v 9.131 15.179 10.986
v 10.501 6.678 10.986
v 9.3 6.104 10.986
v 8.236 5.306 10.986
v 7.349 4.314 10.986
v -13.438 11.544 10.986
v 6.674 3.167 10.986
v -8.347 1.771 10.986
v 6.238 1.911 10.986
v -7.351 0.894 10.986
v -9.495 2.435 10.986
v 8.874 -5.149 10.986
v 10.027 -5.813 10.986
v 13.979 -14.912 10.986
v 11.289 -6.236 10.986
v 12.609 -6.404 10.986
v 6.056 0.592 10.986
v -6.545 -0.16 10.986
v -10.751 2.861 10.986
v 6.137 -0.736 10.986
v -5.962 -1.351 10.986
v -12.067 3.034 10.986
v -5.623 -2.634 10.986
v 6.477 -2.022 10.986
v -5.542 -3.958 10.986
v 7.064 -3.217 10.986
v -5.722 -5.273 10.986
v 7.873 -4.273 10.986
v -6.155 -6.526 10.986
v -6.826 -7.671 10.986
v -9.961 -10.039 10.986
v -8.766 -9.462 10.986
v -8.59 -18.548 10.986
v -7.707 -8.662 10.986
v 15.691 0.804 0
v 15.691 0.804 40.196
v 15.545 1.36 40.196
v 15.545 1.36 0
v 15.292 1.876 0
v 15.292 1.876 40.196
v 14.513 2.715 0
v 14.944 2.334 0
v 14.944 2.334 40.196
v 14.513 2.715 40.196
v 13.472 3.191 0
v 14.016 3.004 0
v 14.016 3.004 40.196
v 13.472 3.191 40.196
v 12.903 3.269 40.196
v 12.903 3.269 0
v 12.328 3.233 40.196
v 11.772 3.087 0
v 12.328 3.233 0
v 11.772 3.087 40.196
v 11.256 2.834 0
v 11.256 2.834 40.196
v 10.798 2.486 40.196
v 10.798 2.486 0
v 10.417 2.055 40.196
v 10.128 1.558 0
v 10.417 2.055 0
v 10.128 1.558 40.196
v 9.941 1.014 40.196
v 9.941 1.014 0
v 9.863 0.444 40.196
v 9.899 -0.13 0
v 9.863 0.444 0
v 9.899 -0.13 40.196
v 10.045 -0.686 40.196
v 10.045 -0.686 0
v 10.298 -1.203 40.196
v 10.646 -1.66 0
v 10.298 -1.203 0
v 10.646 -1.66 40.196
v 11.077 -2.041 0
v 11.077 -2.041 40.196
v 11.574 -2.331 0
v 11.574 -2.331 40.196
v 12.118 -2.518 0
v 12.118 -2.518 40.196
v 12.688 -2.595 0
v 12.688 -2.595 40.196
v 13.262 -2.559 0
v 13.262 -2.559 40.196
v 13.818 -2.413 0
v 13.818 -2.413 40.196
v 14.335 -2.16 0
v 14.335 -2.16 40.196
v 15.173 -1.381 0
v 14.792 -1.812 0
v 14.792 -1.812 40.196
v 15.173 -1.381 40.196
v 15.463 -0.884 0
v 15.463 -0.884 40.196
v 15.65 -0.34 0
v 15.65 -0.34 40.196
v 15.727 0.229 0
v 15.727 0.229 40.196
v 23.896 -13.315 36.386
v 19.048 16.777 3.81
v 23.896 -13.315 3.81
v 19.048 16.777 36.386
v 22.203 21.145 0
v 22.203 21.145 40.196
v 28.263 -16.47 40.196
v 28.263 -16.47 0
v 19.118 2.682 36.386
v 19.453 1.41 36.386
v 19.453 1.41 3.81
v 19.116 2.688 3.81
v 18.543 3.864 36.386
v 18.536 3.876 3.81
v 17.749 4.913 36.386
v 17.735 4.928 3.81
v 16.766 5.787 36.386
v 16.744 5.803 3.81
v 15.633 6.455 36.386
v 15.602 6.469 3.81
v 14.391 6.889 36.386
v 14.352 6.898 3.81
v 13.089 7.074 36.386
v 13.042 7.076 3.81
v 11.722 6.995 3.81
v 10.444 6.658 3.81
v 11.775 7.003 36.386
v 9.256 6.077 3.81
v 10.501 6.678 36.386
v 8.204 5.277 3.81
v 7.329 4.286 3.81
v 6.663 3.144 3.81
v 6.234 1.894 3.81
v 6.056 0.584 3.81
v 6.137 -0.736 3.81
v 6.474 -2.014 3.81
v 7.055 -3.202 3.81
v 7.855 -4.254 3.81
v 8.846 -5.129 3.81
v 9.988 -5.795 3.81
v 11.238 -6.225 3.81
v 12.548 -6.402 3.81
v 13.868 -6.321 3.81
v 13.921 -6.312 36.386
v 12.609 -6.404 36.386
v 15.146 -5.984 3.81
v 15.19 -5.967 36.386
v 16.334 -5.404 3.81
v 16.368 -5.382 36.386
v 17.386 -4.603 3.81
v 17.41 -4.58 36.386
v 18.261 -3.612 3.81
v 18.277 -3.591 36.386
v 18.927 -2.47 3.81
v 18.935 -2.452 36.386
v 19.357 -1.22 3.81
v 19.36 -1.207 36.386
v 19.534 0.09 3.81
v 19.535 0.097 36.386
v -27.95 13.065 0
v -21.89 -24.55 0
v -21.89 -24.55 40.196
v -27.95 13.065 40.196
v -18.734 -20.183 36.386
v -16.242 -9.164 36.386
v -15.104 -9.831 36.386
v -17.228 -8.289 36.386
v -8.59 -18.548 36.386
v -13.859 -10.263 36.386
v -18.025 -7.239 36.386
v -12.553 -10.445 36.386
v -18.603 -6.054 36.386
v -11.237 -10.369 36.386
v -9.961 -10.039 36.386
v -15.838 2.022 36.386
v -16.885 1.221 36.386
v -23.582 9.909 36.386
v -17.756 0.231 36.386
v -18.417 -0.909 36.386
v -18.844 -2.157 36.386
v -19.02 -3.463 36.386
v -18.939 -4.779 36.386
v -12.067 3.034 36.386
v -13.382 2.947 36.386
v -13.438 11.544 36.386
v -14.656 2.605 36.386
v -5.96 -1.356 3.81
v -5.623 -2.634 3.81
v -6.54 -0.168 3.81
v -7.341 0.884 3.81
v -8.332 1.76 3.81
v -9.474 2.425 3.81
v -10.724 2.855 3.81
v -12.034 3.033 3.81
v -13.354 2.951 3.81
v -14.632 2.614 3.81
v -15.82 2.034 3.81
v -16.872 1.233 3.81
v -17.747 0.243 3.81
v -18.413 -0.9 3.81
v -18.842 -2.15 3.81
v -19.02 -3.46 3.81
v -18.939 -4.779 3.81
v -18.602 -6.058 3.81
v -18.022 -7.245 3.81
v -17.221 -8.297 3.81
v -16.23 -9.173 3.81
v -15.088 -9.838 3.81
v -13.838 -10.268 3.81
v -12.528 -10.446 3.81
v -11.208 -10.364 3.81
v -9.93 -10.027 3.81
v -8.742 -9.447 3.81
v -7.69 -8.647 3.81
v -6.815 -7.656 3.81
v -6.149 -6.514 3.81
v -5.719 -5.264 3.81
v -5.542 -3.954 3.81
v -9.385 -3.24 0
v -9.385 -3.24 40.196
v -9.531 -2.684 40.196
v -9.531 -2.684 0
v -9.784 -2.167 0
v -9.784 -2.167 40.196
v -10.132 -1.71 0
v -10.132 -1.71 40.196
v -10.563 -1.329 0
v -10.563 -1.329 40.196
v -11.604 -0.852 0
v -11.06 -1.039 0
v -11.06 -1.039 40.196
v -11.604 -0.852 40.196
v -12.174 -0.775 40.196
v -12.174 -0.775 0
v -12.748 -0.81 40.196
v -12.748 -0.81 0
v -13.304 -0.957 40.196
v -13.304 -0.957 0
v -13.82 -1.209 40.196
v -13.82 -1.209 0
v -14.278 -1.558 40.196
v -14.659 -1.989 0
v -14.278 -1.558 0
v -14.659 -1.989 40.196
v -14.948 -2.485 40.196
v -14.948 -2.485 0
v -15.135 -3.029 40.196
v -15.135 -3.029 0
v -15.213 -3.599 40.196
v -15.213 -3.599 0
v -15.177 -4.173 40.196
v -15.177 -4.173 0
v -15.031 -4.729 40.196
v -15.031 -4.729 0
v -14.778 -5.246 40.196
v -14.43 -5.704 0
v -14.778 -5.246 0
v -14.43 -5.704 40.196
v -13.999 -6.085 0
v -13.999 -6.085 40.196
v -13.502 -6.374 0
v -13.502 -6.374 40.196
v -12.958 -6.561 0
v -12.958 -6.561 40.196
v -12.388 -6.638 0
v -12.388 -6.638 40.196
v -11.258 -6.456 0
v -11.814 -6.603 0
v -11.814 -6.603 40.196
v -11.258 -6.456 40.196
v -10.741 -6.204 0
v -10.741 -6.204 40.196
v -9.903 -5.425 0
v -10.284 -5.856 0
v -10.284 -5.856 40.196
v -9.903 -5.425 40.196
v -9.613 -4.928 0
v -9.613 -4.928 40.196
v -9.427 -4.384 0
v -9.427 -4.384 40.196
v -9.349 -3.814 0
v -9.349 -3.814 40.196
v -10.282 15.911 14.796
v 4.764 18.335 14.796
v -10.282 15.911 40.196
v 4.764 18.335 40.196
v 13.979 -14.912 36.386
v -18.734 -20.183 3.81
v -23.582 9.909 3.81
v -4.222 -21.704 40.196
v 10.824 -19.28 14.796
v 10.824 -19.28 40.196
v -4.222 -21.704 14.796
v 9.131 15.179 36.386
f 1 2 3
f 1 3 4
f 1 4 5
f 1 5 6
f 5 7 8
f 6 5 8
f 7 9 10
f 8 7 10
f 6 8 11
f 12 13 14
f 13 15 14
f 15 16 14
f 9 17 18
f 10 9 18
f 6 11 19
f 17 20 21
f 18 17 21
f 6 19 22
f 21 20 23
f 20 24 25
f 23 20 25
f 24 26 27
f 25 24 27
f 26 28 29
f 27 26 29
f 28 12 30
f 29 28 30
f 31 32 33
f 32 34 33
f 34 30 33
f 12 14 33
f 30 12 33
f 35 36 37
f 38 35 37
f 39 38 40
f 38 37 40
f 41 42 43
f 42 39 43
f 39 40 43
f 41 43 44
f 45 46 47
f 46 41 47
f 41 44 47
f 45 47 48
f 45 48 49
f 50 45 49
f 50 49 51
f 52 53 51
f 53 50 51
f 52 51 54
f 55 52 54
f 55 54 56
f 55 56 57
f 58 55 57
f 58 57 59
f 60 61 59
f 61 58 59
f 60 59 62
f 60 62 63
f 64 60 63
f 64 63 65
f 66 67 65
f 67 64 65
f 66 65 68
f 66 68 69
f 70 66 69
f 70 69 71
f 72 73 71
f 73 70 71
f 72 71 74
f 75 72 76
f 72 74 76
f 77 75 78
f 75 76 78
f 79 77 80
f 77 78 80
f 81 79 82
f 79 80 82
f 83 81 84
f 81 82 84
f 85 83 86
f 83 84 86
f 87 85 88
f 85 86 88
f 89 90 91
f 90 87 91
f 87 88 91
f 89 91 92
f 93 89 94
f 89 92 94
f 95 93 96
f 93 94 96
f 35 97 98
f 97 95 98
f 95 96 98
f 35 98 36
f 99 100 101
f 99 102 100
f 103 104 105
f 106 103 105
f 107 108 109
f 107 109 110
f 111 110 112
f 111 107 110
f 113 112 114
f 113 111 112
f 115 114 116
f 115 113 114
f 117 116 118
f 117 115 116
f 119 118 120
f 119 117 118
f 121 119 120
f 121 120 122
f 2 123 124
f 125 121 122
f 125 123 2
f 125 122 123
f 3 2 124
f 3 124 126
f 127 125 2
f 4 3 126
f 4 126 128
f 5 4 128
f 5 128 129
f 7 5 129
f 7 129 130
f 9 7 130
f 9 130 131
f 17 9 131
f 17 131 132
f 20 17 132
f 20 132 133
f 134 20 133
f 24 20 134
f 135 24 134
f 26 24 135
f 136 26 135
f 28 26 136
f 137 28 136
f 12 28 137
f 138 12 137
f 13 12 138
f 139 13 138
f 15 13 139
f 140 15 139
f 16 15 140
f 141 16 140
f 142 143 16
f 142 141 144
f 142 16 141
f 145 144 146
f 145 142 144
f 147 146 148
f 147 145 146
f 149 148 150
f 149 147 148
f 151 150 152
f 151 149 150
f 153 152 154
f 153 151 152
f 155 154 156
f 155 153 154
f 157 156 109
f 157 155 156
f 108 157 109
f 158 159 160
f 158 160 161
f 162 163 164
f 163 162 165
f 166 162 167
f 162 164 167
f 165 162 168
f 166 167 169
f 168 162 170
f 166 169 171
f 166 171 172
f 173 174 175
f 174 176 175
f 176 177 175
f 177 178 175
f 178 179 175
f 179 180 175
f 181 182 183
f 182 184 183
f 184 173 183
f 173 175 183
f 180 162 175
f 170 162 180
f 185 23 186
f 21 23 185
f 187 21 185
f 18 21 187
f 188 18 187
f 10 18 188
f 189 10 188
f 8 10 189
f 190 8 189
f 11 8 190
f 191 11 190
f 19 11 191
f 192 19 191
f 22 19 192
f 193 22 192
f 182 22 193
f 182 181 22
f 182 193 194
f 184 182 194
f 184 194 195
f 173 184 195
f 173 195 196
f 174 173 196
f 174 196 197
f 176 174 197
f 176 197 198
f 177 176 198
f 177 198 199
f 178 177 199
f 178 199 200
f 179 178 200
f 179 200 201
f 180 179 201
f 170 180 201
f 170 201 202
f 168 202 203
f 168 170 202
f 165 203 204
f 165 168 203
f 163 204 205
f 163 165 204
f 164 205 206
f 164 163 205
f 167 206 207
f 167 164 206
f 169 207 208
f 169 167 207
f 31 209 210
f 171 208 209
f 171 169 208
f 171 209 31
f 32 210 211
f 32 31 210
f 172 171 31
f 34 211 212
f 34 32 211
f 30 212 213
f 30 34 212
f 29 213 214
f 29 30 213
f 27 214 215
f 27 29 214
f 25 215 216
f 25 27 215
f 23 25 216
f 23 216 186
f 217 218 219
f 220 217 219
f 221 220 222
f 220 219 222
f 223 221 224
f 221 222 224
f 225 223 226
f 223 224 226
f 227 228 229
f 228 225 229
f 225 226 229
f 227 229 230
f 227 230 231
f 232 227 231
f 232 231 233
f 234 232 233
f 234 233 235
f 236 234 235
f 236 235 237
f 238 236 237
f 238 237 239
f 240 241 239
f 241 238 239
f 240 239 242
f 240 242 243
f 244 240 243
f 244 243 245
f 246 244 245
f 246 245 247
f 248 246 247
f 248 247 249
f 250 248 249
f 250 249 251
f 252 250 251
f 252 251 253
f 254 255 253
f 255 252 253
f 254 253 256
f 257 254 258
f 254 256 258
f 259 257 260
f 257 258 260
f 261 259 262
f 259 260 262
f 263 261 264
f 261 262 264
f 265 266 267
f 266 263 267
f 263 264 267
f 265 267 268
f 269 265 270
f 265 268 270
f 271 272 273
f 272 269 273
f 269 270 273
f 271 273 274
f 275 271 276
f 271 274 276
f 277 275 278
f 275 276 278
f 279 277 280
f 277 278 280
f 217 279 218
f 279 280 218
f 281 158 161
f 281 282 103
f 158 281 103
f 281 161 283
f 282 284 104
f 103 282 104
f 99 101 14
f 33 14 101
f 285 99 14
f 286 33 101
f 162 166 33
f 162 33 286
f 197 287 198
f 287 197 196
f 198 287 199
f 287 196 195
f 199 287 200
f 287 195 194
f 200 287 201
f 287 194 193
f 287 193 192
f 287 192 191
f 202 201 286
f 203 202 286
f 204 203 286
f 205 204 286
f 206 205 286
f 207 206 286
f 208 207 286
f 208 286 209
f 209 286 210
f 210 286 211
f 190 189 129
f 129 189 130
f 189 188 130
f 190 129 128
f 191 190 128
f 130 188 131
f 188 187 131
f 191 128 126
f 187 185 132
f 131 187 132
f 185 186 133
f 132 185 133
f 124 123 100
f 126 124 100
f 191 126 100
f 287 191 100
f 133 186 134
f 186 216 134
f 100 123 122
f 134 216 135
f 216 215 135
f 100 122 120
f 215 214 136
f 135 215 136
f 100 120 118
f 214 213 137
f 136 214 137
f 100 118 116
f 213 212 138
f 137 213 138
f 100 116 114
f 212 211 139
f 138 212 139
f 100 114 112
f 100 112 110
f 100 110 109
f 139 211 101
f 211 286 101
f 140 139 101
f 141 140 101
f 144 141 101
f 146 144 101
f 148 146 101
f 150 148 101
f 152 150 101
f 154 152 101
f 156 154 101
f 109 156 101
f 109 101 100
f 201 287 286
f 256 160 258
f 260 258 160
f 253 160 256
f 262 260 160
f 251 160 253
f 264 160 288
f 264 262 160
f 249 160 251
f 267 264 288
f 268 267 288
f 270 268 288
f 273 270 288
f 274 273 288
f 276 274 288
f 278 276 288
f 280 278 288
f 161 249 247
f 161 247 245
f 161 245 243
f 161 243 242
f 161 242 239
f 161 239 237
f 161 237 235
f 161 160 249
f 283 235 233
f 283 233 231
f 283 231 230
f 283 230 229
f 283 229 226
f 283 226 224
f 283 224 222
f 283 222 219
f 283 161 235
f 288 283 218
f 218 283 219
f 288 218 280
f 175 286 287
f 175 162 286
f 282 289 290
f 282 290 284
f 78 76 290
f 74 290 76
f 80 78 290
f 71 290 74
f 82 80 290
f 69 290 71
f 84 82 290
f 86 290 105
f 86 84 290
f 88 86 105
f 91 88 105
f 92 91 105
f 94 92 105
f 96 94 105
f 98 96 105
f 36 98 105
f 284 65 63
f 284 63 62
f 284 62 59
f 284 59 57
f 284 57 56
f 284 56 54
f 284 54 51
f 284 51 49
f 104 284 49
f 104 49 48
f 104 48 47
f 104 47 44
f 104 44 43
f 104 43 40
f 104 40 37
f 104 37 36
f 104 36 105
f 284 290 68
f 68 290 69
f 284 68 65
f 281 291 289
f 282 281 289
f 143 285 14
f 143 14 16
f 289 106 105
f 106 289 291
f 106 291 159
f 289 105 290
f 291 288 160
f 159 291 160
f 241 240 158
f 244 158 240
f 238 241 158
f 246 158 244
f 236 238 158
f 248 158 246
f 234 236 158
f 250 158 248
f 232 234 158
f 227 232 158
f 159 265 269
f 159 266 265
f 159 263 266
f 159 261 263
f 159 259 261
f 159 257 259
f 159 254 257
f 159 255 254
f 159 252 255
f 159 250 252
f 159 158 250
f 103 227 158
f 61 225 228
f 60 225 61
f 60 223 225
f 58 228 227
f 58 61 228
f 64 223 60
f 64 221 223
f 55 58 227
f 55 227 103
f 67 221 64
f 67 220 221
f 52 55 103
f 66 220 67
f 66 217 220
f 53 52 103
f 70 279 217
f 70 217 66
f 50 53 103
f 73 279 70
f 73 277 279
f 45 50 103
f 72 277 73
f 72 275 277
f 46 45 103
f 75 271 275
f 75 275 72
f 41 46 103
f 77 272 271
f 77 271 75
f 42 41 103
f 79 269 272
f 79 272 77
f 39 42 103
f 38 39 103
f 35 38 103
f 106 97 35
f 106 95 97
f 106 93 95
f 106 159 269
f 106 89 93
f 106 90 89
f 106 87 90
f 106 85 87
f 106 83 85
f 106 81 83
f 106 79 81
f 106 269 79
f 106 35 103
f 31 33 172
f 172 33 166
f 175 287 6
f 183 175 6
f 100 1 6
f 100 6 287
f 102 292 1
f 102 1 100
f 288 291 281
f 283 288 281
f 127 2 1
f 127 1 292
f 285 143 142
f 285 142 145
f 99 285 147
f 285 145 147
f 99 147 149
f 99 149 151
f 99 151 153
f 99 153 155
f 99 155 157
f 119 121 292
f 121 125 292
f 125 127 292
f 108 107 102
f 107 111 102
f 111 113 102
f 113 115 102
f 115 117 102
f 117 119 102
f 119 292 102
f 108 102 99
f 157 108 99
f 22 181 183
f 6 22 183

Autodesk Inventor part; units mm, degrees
ref_plane "YZ Plane" through (0, 0, 0) normal (1, 0, 0) x (0, 1, 0)
ref_plane "XZ Plane" through (0, 0, 0) normal (0, 1, 0) x (-1, 0, 0)
ref_plane "Work Plane1" through (1.0078, -6.2592, 14.7955) normal (0, 0, -1) x (0.9872698, 0.1590547, 0)
sketch "Sketch1" plane through (1.0078, -6.2592, 14.7955) normal (0, 0, -1) x (0.9872698, 0.1590547, 0)
  circle A0 centre (12.6864, -4.6373) radius 2.9337 projected
  circle A1 centre (-12.7136, -4.6337) radius 2.9337 projected
  line L0 (25.2845, 14.4163) -> (-25.5155, 14.4163)
  line L1 (-25.5155, 14.4163) -> (-25.5155, -23.6837)
  line L2 (-25.5155, -23.6837) -> (25.2845, -23.6837)
  line L3 (25.2845, -23.6837) -> (25.2845, 14.4163)
  point P0 (0.0006, -6.3398)
  dimension "d0" = 50.8
  dimension "d1" = 38.1
  dimension "d2" = 19.05
  dimension "d3" = 12.8018
ref_plane "Work Plane2" through (-93.6315, -146.1207, 0) normal (0, 0, 1) x (1, 0, 0)
extrude "Extrusion1" add sketch "Sketch1" along normal up to surface (14.7955 mm away)
sketch "Sketch2" plane through (1.0078, -6.2592, 14.7955) normal (0, 0, 1) x (0.9872698, 0.1590547, 0)
  line L0 (6.35, -58.321) -> (6.35, 48.9196) projected
  line L1 (-6.35, 49.2476) -> (-6.35, -58.321) projected
  circle A0 centre (-12.7136, 4.6337) radius 2.9337 projected
  circle A1 centre (12.6864, 4.6373) radius 2.9337 projected
  line L2 (25.2845, -14.4163) -> (-25.5155, -14.4163) projected
  line L3 (25.2845, 23.6837) -> (25.2845, -14.4163) projected
  line L4 (-25.5155, 23.6837) -> (25.2845, 23.6837) projected
  line L5 (-25.5155, -14.4163) -> (-25.5155, 23.6837) projected
  line L6 (25.2845, -14.4163) -> (-25.5155, -14.4163) projected
  line L7 (25.2845, -14.4163) -> (7.62, -14.4163)
  line L8 (7.62, -14.4163) -> (7.62, 23.6837)
  line L9 (7.62, 23.6837) -> (25.2845, 23.6837)
  line L10 (25.2845, 23.6837) -> (25.2845, -14.4163)
  line L11 (-25.5155, -14.4163) -> (-25.5155, 23.6837) projected
  line L12 (-25.5155, -14.4163) -> (-7.62, -14.4163)
  line L13 (-7.62, -14.4163) -> (-7.62, 23.6837)
  line L14 (-7.62, 23.6837) -> (-25.5155, 23.6837)
  line L15 (-25.5155, 23.6837) -> (-25.5155, -14.4163)
  point P0 (0.0006, 6.3398)
  dimension "d6" = 1.27
  dimension "d7" = 1.27
extrude "Extrusion2" add sketch "Sketch2" along normal blind 25.4 contours L8 L4 L3 L2 | L2 L5 L4 L13
shell "Shell1" thickness 3.81 removed faces 0
properties part number "wrench holder"
